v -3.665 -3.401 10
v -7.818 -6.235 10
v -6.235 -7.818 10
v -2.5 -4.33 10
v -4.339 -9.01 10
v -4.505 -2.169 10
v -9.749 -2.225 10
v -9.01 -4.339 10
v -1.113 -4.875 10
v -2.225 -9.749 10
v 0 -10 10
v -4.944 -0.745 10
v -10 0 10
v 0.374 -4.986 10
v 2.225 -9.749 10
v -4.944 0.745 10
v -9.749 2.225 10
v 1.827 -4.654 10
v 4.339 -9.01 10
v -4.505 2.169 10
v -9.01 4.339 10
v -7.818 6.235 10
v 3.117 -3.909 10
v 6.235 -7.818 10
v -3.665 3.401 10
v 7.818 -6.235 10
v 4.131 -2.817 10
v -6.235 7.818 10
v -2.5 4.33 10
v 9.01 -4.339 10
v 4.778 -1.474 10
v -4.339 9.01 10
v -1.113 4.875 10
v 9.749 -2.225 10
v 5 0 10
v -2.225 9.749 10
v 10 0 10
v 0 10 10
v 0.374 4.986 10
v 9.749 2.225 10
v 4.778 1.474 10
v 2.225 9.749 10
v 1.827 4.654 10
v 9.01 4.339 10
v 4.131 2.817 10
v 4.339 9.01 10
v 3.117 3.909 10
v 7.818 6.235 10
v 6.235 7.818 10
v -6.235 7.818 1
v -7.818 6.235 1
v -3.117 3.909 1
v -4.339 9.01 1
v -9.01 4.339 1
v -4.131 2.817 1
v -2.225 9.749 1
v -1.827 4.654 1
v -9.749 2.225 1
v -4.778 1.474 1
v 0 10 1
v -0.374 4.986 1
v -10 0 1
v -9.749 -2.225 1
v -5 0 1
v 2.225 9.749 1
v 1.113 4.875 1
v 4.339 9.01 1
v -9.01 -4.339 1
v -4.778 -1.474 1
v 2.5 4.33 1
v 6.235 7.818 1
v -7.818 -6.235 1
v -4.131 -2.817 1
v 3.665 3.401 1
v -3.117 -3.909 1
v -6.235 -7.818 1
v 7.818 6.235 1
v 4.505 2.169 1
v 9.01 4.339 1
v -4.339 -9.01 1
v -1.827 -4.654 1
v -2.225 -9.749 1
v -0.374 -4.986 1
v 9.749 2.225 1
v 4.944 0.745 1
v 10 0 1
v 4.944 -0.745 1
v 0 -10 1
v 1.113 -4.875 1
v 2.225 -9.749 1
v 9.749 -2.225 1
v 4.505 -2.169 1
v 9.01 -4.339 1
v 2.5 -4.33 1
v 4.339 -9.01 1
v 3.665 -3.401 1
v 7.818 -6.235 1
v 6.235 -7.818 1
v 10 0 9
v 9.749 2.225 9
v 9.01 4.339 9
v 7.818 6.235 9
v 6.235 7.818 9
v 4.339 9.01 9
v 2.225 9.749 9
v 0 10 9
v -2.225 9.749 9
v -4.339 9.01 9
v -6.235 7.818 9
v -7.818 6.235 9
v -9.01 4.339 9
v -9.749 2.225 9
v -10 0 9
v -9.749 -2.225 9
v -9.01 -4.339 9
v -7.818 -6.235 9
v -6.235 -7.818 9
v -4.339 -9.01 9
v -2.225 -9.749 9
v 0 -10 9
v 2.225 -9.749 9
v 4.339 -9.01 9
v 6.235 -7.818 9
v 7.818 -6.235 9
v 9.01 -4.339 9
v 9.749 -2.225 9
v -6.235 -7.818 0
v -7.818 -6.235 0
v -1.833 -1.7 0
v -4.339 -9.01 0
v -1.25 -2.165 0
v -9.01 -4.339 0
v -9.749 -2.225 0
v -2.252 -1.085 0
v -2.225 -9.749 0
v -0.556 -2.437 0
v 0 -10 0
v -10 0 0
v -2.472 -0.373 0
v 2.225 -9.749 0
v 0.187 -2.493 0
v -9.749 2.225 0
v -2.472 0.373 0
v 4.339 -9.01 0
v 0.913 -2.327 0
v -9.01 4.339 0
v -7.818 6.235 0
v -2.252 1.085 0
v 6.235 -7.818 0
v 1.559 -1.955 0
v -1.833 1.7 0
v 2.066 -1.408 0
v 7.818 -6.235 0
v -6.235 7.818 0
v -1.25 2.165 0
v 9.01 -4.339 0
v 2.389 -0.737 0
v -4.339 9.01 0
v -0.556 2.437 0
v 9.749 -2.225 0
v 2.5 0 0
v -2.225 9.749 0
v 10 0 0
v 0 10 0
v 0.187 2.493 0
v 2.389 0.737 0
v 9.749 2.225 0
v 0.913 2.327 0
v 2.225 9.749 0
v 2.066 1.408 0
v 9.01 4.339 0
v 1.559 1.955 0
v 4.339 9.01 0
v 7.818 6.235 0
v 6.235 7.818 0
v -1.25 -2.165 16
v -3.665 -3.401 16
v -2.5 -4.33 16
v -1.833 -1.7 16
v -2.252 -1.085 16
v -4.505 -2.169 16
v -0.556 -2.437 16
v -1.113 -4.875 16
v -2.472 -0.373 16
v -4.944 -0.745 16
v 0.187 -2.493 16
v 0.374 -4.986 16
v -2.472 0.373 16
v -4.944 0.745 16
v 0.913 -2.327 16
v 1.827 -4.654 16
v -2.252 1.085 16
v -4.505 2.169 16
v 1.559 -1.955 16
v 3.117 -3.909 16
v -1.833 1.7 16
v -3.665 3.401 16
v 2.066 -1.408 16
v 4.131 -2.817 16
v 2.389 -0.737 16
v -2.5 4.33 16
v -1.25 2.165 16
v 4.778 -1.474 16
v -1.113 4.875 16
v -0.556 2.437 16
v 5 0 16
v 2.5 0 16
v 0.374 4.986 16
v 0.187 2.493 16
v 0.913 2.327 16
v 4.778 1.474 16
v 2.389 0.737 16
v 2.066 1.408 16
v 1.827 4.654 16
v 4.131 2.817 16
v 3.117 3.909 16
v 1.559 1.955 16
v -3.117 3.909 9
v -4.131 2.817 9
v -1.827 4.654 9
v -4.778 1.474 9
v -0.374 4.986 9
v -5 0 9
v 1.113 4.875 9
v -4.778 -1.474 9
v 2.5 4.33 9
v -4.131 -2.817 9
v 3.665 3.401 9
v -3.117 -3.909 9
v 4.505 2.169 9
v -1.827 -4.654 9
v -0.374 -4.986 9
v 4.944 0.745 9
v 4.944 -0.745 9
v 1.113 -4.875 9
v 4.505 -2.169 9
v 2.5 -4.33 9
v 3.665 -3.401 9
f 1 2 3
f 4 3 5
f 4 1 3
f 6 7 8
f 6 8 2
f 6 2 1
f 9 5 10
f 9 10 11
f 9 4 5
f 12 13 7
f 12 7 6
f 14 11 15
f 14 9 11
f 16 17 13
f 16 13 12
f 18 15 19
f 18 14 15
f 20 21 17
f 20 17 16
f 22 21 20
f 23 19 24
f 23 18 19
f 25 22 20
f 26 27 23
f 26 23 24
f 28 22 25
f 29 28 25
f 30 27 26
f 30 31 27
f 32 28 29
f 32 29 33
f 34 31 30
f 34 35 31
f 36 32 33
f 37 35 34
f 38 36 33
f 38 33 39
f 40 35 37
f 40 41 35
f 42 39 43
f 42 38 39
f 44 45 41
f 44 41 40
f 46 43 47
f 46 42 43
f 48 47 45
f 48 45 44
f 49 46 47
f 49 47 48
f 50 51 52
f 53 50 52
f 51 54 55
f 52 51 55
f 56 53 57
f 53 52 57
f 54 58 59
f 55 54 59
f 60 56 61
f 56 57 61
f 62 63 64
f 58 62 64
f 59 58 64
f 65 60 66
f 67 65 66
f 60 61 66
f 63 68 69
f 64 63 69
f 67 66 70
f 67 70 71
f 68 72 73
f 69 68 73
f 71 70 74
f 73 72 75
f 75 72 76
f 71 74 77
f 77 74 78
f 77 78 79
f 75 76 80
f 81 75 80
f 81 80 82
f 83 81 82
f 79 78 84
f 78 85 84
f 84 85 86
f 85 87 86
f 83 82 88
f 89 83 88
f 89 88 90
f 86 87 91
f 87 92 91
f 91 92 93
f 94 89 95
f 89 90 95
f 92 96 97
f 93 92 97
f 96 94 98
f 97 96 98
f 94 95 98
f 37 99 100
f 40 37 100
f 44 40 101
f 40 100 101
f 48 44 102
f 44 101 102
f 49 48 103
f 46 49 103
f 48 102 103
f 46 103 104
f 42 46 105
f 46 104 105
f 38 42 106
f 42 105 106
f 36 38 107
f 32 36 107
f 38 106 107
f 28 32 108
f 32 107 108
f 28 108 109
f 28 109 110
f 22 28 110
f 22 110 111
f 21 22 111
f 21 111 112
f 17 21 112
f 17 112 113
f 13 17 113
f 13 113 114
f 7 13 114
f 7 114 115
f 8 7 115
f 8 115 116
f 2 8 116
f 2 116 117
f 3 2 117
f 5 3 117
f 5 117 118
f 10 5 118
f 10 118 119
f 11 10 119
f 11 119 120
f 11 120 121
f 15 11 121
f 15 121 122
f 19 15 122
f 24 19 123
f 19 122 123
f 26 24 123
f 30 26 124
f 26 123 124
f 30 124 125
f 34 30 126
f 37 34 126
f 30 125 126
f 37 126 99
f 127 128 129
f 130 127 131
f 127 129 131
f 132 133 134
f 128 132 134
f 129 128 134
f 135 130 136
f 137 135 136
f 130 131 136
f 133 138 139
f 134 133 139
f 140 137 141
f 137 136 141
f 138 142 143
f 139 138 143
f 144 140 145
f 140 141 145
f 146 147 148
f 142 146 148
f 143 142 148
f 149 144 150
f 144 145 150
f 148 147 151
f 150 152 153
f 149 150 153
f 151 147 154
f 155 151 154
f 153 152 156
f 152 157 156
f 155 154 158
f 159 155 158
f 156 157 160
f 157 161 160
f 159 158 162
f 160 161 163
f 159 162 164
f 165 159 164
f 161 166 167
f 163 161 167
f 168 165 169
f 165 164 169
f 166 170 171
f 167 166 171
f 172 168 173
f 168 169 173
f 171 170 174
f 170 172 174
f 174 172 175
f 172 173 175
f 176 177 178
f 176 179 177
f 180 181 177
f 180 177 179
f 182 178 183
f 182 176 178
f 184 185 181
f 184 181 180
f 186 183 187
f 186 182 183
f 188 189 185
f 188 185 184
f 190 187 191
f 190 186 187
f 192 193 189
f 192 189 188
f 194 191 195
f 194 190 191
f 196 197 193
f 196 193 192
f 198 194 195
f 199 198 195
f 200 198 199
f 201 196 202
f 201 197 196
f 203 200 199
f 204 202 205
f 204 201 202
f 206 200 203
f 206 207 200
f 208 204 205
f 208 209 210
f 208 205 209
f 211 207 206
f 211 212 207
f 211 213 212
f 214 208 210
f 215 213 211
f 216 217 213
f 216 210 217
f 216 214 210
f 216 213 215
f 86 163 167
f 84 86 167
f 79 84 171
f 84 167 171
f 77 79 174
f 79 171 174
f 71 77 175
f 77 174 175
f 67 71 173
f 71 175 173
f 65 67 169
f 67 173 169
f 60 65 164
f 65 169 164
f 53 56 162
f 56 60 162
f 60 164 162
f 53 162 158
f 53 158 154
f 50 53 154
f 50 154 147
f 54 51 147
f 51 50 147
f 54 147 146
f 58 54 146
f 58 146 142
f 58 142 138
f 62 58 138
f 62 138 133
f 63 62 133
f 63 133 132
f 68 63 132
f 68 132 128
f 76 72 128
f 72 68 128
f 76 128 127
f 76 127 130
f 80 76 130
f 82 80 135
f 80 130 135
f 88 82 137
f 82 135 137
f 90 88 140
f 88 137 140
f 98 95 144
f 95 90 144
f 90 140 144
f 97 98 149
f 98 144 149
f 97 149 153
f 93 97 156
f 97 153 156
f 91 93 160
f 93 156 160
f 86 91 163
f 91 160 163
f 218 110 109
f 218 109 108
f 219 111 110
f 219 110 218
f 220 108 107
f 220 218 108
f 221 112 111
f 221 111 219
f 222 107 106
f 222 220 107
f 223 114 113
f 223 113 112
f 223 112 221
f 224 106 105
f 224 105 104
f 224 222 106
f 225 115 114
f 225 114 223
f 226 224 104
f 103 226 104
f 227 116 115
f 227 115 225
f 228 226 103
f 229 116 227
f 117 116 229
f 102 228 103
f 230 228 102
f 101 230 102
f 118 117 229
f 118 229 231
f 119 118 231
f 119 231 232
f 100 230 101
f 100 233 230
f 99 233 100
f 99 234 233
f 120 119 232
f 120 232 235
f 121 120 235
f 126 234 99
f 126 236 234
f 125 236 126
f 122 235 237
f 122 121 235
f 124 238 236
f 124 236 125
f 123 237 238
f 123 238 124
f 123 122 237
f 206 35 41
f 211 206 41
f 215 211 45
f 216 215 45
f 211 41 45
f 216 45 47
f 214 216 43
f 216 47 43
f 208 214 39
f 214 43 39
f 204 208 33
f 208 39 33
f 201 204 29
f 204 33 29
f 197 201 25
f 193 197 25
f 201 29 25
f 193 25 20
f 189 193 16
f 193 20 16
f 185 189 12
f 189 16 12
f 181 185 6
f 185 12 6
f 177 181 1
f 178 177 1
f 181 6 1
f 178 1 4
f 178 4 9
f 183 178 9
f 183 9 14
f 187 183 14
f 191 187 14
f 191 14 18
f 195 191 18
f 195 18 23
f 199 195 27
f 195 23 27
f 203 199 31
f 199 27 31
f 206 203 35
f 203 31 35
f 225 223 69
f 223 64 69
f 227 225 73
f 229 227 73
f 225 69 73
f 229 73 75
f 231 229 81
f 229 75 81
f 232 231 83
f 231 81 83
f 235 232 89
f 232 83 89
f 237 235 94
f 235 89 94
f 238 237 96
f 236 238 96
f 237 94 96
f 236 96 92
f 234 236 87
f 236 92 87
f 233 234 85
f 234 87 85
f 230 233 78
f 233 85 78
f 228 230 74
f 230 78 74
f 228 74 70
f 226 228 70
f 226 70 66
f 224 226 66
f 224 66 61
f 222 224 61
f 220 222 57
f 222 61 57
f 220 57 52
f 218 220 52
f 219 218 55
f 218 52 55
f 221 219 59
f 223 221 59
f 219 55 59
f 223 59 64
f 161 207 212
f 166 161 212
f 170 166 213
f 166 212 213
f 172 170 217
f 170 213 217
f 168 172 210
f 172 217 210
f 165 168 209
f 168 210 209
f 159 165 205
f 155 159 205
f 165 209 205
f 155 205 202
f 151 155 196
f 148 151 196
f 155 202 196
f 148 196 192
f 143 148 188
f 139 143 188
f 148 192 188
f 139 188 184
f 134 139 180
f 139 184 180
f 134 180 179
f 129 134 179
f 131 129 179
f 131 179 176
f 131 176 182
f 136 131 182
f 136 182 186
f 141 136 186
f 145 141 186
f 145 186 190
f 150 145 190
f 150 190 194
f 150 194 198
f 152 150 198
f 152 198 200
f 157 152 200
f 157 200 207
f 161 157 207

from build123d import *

# Parameters (mm, degrees)
ESQUISSE1_R             = 10
BOSS_EXTRU_1_DEPTH      = 10
ESQUISSE2_R             = 5
BOSS_EXTRU_2_DEPTH      = 6
ESQUISSE3_R             = 2.5
ENL_V_MAT_EXTRU_1_DEPTH = 22.354156504
ESQUISSE4_W             = 8
ESQUISSE4_H             = 5


with BuildPart() as part:
    # Esquisse1 → Boss.-Extru.1 (new body)
    with BuildSketch(Plane.XY):
        Circle(ESQUISSE1_R)
    extrude(amount=BOSS_EXTRU_1_DEPTH)

    # Esquisse2 → Boss.-Extru.2 (add)
    with BuildSketch(Plane.XY.offset(10)):
        Circle(ESQUISSE2_R)
    extrude(amount=BOSS_EXTRU_2_DEPTH)

    # Esquisse3 → Enlèv. mat.-Extru.1 (cut, through all)
    with BuildSketch(Plane.XY.offset(16)):
        Circle(ESQUISSE3_R)
    extrude(amount=-ENL_V_MAT_EXTRU_1_DEPTH, mode=Mode.SUBTRACT)

    # Esquisse4 → Enlèvement de matière-Révolution1 (revolve, cut)
    with BuildSketch(Plane(origin=(0, 0, 0), x_dir=(0, 0, -1), z_dir=(1, 0, 0)), mode=Mode.PRIVATE) as enl_vement_de_mati_re_r_volution1_sk:
        with Locations((-5, 7.5)):
            Rectangle(ESQUISSE4_W, ESQUISSE4_H)
    revolve(enl_vement_de_mati_re_r_volution1_sk.sketch.rotate(Axis((0, 0, 0), (0, 0, 1)), 90), axis=Axis((0, 0, 0), (0, 0, 1)), mode=Mode.SUBTRACT)


solid = part.part
